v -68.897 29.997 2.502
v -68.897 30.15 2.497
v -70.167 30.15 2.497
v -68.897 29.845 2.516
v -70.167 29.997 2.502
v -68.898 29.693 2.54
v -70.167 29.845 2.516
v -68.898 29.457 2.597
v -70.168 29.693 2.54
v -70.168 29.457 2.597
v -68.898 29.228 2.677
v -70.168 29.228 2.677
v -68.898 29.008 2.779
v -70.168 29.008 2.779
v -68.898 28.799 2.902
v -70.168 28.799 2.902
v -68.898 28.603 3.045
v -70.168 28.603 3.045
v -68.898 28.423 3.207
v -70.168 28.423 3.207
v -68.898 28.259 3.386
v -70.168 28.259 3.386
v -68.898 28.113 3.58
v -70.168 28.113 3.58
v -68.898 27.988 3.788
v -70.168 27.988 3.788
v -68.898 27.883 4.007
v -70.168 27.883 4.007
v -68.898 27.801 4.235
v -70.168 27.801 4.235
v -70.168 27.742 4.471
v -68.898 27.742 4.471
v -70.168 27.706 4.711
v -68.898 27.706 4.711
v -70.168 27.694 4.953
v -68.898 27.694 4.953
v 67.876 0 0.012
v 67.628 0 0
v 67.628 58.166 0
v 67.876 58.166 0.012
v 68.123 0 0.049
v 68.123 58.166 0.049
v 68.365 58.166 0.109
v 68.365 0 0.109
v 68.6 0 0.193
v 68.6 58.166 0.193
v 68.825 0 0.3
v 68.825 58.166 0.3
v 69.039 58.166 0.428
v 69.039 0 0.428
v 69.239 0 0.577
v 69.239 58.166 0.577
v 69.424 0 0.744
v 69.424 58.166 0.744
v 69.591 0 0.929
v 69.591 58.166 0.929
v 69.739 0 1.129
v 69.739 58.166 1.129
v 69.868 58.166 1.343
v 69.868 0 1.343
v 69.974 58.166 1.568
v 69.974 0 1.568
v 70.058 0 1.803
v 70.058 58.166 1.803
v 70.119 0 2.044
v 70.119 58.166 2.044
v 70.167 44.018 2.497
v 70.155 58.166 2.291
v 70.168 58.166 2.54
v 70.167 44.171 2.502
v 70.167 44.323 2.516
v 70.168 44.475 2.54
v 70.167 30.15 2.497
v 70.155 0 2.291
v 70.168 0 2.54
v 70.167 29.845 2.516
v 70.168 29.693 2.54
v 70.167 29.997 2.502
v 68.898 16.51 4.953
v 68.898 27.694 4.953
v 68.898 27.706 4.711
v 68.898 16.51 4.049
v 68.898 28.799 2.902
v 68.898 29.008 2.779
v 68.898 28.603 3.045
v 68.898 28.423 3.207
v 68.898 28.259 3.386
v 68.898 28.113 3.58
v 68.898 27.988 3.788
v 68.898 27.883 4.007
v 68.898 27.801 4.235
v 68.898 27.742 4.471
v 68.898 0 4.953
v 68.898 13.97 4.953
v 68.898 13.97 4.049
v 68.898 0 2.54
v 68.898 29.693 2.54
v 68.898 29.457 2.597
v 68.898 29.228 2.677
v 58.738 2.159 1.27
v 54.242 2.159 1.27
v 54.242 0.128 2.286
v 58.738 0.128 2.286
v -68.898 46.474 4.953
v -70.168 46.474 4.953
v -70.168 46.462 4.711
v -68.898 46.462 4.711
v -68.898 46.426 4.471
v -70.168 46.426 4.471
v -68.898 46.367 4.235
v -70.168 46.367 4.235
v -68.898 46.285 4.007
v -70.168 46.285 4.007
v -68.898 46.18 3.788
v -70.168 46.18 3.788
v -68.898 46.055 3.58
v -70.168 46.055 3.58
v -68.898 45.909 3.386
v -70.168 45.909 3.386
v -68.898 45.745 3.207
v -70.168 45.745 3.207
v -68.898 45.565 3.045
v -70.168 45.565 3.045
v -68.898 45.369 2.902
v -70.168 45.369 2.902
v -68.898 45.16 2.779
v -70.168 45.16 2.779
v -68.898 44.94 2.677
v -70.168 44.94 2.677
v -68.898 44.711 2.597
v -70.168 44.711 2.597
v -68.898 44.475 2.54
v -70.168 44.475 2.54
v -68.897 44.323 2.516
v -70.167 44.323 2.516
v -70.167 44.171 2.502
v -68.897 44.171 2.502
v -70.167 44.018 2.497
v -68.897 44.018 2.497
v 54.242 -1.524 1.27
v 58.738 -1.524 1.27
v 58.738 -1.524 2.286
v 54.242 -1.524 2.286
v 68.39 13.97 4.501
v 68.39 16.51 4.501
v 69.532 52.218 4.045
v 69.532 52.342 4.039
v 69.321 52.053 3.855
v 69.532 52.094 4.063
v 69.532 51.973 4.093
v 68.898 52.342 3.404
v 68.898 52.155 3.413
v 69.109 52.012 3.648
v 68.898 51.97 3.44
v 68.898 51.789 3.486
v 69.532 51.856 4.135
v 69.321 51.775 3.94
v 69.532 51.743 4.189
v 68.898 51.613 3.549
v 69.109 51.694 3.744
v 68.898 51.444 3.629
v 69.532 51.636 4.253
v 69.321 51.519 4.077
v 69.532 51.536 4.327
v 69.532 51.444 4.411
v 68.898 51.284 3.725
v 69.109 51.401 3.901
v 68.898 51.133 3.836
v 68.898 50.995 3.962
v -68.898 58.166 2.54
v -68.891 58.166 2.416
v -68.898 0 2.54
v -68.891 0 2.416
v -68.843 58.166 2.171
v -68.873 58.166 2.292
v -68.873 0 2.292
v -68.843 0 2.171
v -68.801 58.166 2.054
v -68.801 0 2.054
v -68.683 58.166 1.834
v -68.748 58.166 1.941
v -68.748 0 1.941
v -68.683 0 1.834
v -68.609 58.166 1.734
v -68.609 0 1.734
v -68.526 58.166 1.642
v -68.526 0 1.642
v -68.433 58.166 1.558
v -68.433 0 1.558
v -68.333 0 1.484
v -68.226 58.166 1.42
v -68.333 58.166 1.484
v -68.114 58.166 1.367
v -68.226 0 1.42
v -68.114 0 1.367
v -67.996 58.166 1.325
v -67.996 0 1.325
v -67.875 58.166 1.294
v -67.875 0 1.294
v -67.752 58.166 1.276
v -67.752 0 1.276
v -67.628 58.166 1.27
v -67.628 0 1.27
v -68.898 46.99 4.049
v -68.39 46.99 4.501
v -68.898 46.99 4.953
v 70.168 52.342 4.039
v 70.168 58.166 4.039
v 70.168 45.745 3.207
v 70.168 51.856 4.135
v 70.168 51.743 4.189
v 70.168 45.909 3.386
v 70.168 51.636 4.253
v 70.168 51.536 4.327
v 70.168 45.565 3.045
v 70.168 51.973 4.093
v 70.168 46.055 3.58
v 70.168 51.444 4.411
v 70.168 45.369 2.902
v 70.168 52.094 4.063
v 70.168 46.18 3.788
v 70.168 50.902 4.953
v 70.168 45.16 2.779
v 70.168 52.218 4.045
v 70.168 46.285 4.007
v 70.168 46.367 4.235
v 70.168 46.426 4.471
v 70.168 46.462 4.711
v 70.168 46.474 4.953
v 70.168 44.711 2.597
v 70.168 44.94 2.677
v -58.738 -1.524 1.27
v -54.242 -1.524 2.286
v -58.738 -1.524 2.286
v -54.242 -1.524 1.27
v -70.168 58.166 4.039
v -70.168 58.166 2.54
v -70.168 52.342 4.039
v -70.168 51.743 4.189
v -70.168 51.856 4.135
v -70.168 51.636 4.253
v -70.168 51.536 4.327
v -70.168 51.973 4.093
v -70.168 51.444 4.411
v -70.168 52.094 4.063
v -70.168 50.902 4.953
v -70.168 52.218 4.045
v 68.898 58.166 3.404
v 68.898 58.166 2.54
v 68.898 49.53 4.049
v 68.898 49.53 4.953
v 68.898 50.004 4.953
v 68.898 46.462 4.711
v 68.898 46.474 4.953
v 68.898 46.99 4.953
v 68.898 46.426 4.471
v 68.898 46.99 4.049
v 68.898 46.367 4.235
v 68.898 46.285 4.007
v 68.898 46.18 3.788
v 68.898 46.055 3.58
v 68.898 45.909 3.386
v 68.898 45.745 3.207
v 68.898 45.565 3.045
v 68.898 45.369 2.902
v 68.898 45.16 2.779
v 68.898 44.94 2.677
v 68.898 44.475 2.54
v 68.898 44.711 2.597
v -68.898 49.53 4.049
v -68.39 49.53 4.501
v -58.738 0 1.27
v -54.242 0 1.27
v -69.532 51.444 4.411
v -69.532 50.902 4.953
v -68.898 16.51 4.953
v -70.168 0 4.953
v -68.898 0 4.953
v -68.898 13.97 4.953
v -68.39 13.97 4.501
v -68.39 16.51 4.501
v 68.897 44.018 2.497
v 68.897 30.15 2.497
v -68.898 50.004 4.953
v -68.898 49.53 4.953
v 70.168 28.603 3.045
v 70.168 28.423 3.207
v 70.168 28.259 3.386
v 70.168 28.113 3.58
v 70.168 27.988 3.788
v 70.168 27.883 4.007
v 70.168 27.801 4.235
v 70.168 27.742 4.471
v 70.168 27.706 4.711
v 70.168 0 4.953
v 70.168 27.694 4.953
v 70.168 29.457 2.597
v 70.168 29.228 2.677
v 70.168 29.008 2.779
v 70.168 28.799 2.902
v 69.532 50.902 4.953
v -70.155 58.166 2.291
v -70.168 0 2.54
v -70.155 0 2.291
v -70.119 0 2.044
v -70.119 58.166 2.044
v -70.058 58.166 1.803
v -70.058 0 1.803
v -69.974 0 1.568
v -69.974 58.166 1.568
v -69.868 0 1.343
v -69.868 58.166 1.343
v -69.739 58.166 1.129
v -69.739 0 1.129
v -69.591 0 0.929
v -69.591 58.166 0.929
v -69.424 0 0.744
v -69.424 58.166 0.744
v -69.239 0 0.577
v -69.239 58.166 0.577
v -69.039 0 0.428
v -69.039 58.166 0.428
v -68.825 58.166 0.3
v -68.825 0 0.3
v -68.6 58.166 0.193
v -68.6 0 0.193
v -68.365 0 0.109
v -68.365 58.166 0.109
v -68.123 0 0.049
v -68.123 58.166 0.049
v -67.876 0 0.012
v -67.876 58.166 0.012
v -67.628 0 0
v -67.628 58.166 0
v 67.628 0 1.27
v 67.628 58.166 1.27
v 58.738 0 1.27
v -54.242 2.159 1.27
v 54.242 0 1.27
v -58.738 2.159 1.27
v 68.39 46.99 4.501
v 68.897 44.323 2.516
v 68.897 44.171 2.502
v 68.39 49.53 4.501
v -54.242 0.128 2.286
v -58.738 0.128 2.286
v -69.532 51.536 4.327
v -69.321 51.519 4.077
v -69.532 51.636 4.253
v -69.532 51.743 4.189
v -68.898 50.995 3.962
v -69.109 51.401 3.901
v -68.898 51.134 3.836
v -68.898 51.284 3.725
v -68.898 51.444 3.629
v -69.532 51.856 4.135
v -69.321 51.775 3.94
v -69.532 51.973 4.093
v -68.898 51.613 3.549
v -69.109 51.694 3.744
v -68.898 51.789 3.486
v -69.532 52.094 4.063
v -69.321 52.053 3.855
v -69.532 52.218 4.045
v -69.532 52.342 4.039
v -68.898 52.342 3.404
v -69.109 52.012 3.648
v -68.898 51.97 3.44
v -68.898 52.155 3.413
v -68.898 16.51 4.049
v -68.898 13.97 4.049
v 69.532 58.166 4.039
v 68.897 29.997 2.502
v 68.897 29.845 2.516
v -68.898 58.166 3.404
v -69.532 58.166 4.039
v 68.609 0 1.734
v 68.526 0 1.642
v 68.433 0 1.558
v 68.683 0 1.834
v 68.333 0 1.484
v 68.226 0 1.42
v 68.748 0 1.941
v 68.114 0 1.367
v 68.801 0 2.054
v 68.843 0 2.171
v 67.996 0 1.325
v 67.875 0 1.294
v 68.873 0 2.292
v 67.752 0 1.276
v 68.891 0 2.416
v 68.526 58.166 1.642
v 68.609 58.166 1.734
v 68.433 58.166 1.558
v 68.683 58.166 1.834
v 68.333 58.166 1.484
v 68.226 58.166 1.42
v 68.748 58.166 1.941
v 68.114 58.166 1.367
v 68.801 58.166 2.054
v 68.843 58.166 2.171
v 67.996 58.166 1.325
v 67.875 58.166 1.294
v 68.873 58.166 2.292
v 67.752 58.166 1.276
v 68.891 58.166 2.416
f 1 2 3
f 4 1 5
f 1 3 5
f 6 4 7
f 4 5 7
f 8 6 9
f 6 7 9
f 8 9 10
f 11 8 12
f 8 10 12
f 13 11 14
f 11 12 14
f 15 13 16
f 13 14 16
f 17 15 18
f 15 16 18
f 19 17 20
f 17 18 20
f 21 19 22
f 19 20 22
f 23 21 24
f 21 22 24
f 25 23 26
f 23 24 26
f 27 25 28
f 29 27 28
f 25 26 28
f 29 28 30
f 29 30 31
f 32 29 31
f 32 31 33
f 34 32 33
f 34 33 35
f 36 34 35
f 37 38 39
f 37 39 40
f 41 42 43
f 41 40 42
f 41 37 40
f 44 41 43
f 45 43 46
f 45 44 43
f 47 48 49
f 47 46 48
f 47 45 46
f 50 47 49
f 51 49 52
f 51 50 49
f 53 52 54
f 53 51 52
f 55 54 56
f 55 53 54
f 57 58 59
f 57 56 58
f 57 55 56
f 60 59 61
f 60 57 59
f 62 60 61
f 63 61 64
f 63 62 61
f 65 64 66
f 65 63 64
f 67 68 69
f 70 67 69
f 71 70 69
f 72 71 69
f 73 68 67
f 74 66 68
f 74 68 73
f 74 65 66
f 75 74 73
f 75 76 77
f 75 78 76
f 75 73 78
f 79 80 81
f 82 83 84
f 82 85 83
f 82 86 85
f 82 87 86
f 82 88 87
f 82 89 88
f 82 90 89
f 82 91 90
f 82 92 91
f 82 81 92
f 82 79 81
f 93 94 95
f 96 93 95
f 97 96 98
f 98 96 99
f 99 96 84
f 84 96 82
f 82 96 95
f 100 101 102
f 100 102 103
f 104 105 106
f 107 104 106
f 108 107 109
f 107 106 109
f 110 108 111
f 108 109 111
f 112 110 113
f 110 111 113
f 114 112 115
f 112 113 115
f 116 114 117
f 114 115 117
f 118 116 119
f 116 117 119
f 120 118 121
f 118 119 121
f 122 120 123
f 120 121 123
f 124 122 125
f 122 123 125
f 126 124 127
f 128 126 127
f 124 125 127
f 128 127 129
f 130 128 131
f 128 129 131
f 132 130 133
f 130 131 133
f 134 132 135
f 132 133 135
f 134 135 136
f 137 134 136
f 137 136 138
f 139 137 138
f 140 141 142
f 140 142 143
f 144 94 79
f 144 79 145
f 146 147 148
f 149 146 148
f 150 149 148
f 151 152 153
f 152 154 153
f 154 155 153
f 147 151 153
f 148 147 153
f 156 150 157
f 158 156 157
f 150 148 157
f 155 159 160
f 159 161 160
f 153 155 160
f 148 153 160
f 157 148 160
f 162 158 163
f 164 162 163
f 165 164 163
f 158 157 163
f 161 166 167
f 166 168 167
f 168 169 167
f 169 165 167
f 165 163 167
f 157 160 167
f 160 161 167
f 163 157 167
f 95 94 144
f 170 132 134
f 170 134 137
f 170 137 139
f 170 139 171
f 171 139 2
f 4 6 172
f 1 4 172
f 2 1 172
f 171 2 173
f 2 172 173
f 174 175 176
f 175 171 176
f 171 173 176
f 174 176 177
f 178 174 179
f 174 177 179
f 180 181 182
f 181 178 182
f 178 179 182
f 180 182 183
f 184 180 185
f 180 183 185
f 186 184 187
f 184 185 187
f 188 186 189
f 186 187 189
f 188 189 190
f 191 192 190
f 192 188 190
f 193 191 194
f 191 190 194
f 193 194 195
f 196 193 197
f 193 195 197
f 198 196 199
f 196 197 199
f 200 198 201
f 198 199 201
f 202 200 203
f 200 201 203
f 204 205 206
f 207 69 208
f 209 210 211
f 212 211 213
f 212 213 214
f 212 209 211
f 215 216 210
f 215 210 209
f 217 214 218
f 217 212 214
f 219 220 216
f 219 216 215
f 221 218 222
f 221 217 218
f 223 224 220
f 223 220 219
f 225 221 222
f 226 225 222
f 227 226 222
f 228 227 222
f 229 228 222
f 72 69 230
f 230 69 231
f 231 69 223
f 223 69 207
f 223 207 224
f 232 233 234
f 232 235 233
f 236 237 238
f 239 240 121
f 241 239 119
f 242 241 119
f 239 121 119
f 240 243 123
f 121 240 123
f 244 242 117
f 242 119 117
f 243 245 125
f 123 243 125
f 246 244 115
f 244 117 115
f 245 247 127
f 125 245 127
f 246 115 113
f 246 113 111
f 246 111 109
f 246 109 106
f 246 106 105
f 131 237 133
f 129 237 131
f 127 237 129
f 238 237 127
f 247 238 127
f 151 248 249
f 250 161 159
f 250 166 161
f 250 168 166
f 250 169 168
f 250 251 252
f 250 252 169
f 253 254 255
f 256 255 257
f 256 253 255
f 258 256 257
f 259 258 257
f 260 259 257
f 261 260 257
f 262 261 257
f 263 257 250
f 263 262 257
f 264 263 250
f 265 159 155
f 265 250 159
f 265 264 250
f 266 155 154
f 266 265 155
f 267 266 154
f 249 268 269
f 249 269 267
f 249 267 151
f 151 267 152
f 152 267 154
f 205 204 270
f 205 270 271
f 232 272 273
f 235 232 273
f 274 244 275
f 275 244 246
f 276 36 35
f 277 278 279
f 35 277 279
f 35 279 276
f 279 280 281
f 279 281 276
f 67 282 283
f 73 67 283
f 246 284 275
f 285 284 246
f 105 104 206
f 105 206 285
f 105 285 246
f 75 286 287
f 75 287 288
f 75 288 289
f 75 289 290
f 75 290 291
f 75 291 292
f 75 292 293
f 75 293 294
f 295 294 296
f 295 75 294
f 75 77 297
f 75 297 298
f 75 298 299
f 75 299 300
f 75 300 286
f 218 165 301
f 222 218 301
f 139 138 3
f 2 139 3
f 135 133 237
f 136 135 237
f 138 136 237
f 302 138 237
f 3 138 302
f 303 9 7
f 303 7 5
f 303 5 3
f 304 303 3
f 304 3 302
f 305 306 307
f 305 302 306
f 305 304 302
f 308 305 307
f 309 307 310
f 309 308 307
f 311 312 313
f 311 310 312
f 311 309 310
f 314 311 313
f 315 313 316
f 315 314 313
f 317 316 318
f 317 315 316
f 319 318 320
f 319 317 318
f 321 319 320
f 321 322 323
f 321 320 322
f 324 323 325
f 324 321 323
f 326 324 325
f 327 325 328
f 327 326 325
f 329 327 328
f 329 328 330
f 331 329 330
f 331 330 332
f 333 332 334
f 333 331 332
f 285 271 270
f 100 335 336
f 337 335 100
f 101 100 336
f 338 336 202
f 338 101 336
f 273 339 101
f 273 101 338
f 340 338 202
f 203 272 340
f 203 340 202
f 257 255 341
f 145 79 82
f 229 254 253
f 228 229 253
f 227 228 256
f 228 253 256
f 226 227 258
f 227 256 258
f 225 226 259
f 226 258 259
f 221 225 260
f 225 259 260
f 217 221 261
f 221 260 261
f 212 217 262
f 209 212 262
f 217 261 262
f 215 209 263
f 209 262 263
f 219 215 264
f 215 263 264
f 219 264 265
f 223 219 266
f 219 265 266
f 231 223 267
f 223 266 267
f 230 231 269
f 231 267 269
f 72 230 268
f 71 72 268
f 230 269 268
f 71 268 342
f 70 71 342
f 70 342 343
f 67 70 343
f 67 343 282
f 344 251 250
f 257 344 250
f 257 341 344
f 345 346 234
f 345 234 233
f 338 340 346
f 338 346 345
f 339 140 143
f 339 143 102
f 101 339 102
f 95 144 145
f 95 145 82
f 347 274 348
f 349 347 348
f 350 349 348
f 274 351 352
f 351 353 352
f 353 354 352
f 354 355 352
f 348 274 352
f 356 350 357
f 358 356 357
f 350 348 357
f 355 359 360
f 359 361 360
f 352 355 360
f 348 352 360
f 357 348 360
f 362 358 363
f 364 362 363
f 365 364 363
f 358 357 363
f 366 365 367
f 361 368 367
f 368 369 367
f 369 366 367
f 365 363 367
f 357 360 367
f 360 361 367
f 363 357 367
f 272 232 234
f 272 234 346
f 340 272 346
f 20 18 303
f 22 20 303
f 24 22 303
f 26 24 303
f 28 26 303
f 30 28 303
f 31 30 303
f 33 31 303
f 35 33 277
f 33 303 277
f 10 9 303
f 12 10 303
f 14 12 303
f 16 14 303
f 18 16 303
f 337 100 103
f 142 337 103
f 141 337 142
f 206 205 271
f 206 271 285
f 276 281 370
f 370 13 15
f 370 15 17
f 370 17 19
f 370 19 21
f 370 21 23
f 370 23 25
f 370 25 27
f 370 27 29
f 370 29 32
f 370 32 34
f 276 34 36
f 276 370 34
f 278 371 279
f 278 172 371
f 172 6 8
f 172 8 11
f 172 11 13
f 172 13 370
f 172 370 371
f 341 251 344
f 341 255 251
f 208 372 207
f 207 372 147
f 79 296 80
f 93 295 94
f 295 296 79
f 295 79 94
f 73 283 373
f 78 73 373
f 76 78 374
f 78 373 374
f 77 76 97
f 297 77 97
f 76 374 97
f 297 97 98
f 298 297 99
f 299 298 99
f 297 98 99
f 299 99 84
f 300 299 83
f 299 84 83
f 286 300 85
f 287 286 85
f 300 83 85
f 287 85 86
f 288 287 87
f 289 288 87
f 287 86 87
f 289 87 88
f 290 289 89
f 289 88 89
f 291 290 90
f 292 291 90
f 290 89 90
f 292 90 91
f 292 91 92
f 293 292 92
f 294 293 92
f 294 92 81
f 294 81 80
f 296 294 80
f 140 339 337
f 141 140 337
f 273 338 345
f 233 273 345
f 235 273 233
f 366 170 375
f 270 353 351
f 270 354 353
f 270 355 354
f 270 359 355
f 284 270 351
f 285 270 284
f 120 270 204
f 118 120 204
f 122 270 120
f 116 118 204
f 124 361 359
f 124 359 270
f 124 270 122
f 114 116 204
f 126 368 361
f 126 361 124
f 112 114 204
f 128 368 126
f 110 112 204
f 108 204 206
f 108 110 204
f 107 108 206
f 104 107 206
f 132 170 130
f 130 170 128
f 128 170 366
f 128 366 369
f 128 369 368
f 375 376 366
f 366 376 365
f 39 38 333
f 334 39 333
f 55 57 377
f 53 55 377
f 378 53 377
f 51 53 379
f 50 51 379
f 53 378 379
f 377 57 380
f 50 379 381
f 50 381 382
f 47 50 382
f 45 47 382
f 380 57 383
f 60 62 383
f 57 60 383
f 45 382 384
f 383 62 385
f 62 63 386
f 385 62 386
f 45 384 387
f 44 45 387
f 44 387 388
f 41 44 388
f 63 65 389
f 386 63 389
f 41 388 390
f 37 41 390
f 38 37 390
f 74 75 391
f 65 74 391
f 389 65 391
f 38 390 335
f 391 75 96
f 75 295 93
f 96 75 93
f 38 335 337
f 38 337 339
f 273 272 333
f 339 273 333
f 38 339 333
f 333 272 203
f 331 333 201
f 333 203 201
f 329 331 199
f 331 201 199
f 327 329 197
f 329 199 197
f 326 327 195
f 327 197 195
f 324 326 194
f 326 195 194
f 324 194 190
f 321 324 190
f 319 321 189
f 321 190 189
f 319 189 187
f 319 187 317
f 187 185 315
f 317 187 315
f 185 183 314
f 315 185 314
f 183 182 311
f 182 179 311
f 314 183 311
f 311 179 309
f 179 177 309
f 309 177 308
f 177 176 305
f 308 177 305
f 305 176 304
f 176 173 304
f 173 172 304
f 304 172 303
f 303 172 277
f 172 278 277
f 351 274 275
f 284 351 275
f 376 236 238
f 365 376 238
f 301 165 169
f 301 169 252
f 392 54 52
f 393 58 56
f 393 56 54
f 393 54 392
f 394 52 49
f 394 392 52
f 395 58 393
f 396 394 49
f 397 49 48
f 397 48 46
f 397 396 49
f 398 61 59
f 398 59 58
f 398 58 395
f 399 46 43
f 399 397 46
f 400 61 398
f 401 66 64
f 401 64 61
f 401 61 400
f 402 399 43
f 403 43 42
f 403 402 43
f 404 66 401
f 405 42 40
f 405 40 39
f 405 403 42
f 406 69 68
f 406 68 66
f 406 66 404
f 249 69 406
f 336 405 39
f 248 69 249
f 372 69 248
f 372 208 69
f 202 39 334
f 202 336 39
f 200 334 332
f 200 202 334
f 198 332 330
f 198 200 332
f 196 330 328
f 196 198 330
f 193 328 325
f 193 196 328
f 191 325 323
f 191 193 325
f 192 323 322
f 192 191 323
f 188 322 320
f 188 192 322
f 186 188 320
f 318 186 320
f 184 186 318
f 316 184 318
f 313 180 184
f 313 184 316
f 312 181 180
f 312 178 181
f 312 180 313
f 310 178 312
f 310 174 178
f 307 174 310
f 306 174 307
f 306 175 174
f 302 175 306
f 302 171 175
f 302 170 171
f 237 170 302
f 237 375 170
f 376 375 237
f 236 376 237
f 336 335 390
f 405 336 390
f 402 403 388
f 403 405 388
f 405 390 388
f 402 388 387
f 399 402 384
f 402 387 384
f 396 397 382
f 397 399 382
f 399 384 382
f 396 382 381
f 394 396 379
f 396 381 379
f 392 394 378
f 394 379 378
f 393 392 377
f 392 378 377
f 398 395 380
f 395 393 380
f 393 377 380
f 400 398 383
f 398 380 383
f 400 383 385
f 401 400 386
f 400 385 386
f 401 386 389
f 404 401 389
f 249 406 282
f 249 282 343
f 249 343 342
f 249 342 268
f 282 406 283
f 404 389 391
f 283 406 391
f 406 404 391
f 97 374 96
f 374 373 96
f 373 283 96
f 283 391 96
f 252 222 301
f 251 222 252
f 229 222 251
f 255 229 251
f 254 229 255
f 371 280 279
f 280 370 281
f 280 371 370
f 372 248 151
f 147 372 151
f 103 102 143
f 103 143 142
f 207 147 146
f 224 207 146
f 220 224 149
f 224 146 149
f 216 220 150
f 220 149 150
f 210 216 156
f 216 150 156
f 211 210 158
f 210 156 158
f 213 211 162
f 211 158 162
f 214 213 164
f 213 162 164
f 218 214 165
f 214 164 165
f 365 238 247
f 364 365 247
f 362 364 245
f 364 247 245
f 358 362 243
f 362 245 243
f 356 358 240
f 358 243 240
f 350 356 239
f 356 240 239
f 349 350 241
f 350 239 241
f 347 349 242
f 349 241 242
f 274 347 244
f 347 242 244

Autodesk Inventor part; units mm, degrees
sketch "Sketch1" plane through (0, 0, 0) normal (0, 1, 0) x (-1, 0, 0)
  line L0 (-70.1675, 4.953) -> (70.1675, 4.953) construction
  line L1 (70.1675, 4.953) -> (70.1675, 0) construction
  line L2 (70.1675, 0) -> (-70.1675, 0) construction
  line L3 (-70.1675, 0) -> (-70.1675, 4.953) construction
  line L4 (-67.6275, 0) -> (67.6275, 0)
  arc A0 (67.6275, 0) -> (70.1675, 2.54) centre (67.6275, 2.54) ccw
  line L5 (70.1675, 2.54) -> (70.1675, 4.953)
  arc A1 (-70.1675, 2.54) -> (-67.6275, 0) centre (-67.6275, 2.54) ccw
  line L6 (-70.1675, 2.54) -> (-70.1675, 4.953)
  line L7 (-68.8975, 4.953) -> (-68.8975, 2.54)
  arc A2 (-68.8975, 2.54) -> (-67.6275, 1.27) centre (-67.6275, 2.54) ccw
  line L8 (-67.6275, 1.27) -> (67.6275, 1.27)
  arc A3 (67.6275, 1.27) -> (68.8975, 2.54) centre (67.6275, 2.54) ccw
  line L9 (68.8975, 2.54) -> (68.8975, 4.953)
  line L10 (-70.1675, 4.953) -> (-68.8975, 4.953)
  line L11 (68.8975, 4.953) -> (70.1675, 4.953)
  point P0 (0, 0)
  point P1 (0, 0)
  dimension "d0" = 140.335
  dimension "d1" = 4.953
  dimension "d2" = 1.27
  dimension "d3" = 1.27
extrude "Extrusion1" add sketch "Sketch1" along normal blind 58.166
sketch "Sketch2" plane through (-67.6275, 0, 1.27) normal (0, 0, 1) x (1, 0, 0)
  line L0 (-2.54, 0) -> (-2.54, 58.166) projected
  line L1 (137.795, 0) -> (137.795, 58.166) projected
  line L2 (0, 0) -> (135.255, 0) projected
  line L3 (8.89, 2.159) -> (13.3858, 2.159)
  line L4 (13.3858, 2.159) -> (13.3858, -1.524)
  line L5 (13.3858, -1.524) -> (8.89, -1.524)
  line L6 (8.89, -1.524) -> (8.89, 2.159)
  point P0 (67.6275, 0)
  dimension "d6" = 4.4958
  dimension "d7" = 11.43
  dimension "d8" = 3.683
  dimension "d9" = 1.524
extrude "Extrusion2" add sketch "Sketch2" along normal blind 1.016
chamfer "Chamfer2" distance 2.032 distance2 1.016 1 edges at (-56.4896, 2.159, 2.286) measured on face at (-57.2389, 0.9313, 2.286)
sketch "Sketch3" plane through (0, 0, 0) normal (1, 0, 0) x (0, 1, 0)
  line L0 (0, 4.953) -> (58.166, 4.953) projected
  line L1 (0, 2.54) -> (0, 4.953) projected
  line L2 (58.166, 2.54) -> (58.166, 4.953) projected
  line L3 (0, 0) -> (58.166, 0) projected
  line L4 (0, 0) -> (58.166, 0) projected
  line L5 (46.474, 4.953) -> (27.694, 4.953) construction
  line L6 (44.0182, 2.4972) -> (30.1498, 2.4972)
  line L7 (30.1498, 7.4088) -> (44.0182, 7.4088)
  arc A0 (44.0182, 2.4972) -> (44.0182, 7.4088) centre (44.0182, 4.953) ccw
  arc A1 (30.1498, 7.4088) -> (30.1498, 2.4972) centre (30.1498, 4.953) ccw
  line L8 (58.166, 4.0386) -> (52.3421, 4.0386)
  line L9 (51.444, 4.4106) -> (50.9016, 4.953)
  arc A2 (51.444, 4.4106) -> (52.3421, 4.0386) centre (52.3421, 5.3086) ccw
  point P0 (0, 0)
  point P1 (37.084, 4.953)
  point P2 (51.816, 4.0386)
  dimension "d12" = 18.78
  dimension "d13" = 2.4558
  dimension "d15" = 2.4972
  dimension "d16" = 135
  dimension "d17" = 6.35
  dimension "d18" = 0.9144
  dimension "d19" = 1.27
  dimension "d36" = 37.084
extrude "Extrusion3" cut sketch "Sketch3" along normal through all both and the other way through all
chamfer "Chamfer1" distance 0.635 angle 45 6 edges at (-68.8975, 55.254, 4.0386) (-68.8975, 51.856, 4.1353) (-68.8975, 51.1728, 4.6818) (68.8975, 55.254, 4.0386) (68.8975, 51.856, 4.1353) (68.8975, 51.1728, 4.6818)
ref_plane "Work Plane1" through (0, 13.97, 0) normal (0, 1, 0) x (-1, 0, 0)
ref_plane "Work Plane2" through (0, 16.51, 0) normal (0, 1, 0) x (-1, 0, 0)
ref_plane "Work Plane3" through (0, 46.99, 0) normal (0, 1, 0) x (-1, 0, 0)
ref_plane "Work Plane4" through (0, 49.53, 0) normal (0, 1, 0) x (-1, 0, 0)
sketch "Sketch6" plane through (0, 0, 0) normal (0, 1, 0) x (-1, 0, 0)
  line L0 (-68.8975, 2.54) -> (-68.8975, 4.953) projected
  arc A0 (-68.8975, 2.54) -> (-67.6275, 1.27) centre (-67.6275, 2.54) ccw projected
  line L1 (-68.8975, 4.953) -> (-68.3895, 4.5009)
  line L2 (-68.3895, 4.5009) -> (-68.8975, 4.0488)
  line L3 (-68.3895, 4.5009) -> (-68.8975, 4.5009) construction
  point P0 (0, 0)
  dimension "d25" = 3.683
  dimension "d26" = 2.7788
  dimension "d27" = 0.508
extrude "Extrusion4" add sketch "Sketch6" along normal up to surface (2.54 mm away) from surface at 13.97
extrude "Extrusion5" add sketch "Sketch6" along normal up to surface (2.54 mm away) from surface at 46.99
mirror "Mirror1" about plane through (0, 0, 0) normal (1, 0, 0) of "Extrusion2", "Extrusion4", "Extrusion5", "Chamfer2"
properties part number "KTR-009"
